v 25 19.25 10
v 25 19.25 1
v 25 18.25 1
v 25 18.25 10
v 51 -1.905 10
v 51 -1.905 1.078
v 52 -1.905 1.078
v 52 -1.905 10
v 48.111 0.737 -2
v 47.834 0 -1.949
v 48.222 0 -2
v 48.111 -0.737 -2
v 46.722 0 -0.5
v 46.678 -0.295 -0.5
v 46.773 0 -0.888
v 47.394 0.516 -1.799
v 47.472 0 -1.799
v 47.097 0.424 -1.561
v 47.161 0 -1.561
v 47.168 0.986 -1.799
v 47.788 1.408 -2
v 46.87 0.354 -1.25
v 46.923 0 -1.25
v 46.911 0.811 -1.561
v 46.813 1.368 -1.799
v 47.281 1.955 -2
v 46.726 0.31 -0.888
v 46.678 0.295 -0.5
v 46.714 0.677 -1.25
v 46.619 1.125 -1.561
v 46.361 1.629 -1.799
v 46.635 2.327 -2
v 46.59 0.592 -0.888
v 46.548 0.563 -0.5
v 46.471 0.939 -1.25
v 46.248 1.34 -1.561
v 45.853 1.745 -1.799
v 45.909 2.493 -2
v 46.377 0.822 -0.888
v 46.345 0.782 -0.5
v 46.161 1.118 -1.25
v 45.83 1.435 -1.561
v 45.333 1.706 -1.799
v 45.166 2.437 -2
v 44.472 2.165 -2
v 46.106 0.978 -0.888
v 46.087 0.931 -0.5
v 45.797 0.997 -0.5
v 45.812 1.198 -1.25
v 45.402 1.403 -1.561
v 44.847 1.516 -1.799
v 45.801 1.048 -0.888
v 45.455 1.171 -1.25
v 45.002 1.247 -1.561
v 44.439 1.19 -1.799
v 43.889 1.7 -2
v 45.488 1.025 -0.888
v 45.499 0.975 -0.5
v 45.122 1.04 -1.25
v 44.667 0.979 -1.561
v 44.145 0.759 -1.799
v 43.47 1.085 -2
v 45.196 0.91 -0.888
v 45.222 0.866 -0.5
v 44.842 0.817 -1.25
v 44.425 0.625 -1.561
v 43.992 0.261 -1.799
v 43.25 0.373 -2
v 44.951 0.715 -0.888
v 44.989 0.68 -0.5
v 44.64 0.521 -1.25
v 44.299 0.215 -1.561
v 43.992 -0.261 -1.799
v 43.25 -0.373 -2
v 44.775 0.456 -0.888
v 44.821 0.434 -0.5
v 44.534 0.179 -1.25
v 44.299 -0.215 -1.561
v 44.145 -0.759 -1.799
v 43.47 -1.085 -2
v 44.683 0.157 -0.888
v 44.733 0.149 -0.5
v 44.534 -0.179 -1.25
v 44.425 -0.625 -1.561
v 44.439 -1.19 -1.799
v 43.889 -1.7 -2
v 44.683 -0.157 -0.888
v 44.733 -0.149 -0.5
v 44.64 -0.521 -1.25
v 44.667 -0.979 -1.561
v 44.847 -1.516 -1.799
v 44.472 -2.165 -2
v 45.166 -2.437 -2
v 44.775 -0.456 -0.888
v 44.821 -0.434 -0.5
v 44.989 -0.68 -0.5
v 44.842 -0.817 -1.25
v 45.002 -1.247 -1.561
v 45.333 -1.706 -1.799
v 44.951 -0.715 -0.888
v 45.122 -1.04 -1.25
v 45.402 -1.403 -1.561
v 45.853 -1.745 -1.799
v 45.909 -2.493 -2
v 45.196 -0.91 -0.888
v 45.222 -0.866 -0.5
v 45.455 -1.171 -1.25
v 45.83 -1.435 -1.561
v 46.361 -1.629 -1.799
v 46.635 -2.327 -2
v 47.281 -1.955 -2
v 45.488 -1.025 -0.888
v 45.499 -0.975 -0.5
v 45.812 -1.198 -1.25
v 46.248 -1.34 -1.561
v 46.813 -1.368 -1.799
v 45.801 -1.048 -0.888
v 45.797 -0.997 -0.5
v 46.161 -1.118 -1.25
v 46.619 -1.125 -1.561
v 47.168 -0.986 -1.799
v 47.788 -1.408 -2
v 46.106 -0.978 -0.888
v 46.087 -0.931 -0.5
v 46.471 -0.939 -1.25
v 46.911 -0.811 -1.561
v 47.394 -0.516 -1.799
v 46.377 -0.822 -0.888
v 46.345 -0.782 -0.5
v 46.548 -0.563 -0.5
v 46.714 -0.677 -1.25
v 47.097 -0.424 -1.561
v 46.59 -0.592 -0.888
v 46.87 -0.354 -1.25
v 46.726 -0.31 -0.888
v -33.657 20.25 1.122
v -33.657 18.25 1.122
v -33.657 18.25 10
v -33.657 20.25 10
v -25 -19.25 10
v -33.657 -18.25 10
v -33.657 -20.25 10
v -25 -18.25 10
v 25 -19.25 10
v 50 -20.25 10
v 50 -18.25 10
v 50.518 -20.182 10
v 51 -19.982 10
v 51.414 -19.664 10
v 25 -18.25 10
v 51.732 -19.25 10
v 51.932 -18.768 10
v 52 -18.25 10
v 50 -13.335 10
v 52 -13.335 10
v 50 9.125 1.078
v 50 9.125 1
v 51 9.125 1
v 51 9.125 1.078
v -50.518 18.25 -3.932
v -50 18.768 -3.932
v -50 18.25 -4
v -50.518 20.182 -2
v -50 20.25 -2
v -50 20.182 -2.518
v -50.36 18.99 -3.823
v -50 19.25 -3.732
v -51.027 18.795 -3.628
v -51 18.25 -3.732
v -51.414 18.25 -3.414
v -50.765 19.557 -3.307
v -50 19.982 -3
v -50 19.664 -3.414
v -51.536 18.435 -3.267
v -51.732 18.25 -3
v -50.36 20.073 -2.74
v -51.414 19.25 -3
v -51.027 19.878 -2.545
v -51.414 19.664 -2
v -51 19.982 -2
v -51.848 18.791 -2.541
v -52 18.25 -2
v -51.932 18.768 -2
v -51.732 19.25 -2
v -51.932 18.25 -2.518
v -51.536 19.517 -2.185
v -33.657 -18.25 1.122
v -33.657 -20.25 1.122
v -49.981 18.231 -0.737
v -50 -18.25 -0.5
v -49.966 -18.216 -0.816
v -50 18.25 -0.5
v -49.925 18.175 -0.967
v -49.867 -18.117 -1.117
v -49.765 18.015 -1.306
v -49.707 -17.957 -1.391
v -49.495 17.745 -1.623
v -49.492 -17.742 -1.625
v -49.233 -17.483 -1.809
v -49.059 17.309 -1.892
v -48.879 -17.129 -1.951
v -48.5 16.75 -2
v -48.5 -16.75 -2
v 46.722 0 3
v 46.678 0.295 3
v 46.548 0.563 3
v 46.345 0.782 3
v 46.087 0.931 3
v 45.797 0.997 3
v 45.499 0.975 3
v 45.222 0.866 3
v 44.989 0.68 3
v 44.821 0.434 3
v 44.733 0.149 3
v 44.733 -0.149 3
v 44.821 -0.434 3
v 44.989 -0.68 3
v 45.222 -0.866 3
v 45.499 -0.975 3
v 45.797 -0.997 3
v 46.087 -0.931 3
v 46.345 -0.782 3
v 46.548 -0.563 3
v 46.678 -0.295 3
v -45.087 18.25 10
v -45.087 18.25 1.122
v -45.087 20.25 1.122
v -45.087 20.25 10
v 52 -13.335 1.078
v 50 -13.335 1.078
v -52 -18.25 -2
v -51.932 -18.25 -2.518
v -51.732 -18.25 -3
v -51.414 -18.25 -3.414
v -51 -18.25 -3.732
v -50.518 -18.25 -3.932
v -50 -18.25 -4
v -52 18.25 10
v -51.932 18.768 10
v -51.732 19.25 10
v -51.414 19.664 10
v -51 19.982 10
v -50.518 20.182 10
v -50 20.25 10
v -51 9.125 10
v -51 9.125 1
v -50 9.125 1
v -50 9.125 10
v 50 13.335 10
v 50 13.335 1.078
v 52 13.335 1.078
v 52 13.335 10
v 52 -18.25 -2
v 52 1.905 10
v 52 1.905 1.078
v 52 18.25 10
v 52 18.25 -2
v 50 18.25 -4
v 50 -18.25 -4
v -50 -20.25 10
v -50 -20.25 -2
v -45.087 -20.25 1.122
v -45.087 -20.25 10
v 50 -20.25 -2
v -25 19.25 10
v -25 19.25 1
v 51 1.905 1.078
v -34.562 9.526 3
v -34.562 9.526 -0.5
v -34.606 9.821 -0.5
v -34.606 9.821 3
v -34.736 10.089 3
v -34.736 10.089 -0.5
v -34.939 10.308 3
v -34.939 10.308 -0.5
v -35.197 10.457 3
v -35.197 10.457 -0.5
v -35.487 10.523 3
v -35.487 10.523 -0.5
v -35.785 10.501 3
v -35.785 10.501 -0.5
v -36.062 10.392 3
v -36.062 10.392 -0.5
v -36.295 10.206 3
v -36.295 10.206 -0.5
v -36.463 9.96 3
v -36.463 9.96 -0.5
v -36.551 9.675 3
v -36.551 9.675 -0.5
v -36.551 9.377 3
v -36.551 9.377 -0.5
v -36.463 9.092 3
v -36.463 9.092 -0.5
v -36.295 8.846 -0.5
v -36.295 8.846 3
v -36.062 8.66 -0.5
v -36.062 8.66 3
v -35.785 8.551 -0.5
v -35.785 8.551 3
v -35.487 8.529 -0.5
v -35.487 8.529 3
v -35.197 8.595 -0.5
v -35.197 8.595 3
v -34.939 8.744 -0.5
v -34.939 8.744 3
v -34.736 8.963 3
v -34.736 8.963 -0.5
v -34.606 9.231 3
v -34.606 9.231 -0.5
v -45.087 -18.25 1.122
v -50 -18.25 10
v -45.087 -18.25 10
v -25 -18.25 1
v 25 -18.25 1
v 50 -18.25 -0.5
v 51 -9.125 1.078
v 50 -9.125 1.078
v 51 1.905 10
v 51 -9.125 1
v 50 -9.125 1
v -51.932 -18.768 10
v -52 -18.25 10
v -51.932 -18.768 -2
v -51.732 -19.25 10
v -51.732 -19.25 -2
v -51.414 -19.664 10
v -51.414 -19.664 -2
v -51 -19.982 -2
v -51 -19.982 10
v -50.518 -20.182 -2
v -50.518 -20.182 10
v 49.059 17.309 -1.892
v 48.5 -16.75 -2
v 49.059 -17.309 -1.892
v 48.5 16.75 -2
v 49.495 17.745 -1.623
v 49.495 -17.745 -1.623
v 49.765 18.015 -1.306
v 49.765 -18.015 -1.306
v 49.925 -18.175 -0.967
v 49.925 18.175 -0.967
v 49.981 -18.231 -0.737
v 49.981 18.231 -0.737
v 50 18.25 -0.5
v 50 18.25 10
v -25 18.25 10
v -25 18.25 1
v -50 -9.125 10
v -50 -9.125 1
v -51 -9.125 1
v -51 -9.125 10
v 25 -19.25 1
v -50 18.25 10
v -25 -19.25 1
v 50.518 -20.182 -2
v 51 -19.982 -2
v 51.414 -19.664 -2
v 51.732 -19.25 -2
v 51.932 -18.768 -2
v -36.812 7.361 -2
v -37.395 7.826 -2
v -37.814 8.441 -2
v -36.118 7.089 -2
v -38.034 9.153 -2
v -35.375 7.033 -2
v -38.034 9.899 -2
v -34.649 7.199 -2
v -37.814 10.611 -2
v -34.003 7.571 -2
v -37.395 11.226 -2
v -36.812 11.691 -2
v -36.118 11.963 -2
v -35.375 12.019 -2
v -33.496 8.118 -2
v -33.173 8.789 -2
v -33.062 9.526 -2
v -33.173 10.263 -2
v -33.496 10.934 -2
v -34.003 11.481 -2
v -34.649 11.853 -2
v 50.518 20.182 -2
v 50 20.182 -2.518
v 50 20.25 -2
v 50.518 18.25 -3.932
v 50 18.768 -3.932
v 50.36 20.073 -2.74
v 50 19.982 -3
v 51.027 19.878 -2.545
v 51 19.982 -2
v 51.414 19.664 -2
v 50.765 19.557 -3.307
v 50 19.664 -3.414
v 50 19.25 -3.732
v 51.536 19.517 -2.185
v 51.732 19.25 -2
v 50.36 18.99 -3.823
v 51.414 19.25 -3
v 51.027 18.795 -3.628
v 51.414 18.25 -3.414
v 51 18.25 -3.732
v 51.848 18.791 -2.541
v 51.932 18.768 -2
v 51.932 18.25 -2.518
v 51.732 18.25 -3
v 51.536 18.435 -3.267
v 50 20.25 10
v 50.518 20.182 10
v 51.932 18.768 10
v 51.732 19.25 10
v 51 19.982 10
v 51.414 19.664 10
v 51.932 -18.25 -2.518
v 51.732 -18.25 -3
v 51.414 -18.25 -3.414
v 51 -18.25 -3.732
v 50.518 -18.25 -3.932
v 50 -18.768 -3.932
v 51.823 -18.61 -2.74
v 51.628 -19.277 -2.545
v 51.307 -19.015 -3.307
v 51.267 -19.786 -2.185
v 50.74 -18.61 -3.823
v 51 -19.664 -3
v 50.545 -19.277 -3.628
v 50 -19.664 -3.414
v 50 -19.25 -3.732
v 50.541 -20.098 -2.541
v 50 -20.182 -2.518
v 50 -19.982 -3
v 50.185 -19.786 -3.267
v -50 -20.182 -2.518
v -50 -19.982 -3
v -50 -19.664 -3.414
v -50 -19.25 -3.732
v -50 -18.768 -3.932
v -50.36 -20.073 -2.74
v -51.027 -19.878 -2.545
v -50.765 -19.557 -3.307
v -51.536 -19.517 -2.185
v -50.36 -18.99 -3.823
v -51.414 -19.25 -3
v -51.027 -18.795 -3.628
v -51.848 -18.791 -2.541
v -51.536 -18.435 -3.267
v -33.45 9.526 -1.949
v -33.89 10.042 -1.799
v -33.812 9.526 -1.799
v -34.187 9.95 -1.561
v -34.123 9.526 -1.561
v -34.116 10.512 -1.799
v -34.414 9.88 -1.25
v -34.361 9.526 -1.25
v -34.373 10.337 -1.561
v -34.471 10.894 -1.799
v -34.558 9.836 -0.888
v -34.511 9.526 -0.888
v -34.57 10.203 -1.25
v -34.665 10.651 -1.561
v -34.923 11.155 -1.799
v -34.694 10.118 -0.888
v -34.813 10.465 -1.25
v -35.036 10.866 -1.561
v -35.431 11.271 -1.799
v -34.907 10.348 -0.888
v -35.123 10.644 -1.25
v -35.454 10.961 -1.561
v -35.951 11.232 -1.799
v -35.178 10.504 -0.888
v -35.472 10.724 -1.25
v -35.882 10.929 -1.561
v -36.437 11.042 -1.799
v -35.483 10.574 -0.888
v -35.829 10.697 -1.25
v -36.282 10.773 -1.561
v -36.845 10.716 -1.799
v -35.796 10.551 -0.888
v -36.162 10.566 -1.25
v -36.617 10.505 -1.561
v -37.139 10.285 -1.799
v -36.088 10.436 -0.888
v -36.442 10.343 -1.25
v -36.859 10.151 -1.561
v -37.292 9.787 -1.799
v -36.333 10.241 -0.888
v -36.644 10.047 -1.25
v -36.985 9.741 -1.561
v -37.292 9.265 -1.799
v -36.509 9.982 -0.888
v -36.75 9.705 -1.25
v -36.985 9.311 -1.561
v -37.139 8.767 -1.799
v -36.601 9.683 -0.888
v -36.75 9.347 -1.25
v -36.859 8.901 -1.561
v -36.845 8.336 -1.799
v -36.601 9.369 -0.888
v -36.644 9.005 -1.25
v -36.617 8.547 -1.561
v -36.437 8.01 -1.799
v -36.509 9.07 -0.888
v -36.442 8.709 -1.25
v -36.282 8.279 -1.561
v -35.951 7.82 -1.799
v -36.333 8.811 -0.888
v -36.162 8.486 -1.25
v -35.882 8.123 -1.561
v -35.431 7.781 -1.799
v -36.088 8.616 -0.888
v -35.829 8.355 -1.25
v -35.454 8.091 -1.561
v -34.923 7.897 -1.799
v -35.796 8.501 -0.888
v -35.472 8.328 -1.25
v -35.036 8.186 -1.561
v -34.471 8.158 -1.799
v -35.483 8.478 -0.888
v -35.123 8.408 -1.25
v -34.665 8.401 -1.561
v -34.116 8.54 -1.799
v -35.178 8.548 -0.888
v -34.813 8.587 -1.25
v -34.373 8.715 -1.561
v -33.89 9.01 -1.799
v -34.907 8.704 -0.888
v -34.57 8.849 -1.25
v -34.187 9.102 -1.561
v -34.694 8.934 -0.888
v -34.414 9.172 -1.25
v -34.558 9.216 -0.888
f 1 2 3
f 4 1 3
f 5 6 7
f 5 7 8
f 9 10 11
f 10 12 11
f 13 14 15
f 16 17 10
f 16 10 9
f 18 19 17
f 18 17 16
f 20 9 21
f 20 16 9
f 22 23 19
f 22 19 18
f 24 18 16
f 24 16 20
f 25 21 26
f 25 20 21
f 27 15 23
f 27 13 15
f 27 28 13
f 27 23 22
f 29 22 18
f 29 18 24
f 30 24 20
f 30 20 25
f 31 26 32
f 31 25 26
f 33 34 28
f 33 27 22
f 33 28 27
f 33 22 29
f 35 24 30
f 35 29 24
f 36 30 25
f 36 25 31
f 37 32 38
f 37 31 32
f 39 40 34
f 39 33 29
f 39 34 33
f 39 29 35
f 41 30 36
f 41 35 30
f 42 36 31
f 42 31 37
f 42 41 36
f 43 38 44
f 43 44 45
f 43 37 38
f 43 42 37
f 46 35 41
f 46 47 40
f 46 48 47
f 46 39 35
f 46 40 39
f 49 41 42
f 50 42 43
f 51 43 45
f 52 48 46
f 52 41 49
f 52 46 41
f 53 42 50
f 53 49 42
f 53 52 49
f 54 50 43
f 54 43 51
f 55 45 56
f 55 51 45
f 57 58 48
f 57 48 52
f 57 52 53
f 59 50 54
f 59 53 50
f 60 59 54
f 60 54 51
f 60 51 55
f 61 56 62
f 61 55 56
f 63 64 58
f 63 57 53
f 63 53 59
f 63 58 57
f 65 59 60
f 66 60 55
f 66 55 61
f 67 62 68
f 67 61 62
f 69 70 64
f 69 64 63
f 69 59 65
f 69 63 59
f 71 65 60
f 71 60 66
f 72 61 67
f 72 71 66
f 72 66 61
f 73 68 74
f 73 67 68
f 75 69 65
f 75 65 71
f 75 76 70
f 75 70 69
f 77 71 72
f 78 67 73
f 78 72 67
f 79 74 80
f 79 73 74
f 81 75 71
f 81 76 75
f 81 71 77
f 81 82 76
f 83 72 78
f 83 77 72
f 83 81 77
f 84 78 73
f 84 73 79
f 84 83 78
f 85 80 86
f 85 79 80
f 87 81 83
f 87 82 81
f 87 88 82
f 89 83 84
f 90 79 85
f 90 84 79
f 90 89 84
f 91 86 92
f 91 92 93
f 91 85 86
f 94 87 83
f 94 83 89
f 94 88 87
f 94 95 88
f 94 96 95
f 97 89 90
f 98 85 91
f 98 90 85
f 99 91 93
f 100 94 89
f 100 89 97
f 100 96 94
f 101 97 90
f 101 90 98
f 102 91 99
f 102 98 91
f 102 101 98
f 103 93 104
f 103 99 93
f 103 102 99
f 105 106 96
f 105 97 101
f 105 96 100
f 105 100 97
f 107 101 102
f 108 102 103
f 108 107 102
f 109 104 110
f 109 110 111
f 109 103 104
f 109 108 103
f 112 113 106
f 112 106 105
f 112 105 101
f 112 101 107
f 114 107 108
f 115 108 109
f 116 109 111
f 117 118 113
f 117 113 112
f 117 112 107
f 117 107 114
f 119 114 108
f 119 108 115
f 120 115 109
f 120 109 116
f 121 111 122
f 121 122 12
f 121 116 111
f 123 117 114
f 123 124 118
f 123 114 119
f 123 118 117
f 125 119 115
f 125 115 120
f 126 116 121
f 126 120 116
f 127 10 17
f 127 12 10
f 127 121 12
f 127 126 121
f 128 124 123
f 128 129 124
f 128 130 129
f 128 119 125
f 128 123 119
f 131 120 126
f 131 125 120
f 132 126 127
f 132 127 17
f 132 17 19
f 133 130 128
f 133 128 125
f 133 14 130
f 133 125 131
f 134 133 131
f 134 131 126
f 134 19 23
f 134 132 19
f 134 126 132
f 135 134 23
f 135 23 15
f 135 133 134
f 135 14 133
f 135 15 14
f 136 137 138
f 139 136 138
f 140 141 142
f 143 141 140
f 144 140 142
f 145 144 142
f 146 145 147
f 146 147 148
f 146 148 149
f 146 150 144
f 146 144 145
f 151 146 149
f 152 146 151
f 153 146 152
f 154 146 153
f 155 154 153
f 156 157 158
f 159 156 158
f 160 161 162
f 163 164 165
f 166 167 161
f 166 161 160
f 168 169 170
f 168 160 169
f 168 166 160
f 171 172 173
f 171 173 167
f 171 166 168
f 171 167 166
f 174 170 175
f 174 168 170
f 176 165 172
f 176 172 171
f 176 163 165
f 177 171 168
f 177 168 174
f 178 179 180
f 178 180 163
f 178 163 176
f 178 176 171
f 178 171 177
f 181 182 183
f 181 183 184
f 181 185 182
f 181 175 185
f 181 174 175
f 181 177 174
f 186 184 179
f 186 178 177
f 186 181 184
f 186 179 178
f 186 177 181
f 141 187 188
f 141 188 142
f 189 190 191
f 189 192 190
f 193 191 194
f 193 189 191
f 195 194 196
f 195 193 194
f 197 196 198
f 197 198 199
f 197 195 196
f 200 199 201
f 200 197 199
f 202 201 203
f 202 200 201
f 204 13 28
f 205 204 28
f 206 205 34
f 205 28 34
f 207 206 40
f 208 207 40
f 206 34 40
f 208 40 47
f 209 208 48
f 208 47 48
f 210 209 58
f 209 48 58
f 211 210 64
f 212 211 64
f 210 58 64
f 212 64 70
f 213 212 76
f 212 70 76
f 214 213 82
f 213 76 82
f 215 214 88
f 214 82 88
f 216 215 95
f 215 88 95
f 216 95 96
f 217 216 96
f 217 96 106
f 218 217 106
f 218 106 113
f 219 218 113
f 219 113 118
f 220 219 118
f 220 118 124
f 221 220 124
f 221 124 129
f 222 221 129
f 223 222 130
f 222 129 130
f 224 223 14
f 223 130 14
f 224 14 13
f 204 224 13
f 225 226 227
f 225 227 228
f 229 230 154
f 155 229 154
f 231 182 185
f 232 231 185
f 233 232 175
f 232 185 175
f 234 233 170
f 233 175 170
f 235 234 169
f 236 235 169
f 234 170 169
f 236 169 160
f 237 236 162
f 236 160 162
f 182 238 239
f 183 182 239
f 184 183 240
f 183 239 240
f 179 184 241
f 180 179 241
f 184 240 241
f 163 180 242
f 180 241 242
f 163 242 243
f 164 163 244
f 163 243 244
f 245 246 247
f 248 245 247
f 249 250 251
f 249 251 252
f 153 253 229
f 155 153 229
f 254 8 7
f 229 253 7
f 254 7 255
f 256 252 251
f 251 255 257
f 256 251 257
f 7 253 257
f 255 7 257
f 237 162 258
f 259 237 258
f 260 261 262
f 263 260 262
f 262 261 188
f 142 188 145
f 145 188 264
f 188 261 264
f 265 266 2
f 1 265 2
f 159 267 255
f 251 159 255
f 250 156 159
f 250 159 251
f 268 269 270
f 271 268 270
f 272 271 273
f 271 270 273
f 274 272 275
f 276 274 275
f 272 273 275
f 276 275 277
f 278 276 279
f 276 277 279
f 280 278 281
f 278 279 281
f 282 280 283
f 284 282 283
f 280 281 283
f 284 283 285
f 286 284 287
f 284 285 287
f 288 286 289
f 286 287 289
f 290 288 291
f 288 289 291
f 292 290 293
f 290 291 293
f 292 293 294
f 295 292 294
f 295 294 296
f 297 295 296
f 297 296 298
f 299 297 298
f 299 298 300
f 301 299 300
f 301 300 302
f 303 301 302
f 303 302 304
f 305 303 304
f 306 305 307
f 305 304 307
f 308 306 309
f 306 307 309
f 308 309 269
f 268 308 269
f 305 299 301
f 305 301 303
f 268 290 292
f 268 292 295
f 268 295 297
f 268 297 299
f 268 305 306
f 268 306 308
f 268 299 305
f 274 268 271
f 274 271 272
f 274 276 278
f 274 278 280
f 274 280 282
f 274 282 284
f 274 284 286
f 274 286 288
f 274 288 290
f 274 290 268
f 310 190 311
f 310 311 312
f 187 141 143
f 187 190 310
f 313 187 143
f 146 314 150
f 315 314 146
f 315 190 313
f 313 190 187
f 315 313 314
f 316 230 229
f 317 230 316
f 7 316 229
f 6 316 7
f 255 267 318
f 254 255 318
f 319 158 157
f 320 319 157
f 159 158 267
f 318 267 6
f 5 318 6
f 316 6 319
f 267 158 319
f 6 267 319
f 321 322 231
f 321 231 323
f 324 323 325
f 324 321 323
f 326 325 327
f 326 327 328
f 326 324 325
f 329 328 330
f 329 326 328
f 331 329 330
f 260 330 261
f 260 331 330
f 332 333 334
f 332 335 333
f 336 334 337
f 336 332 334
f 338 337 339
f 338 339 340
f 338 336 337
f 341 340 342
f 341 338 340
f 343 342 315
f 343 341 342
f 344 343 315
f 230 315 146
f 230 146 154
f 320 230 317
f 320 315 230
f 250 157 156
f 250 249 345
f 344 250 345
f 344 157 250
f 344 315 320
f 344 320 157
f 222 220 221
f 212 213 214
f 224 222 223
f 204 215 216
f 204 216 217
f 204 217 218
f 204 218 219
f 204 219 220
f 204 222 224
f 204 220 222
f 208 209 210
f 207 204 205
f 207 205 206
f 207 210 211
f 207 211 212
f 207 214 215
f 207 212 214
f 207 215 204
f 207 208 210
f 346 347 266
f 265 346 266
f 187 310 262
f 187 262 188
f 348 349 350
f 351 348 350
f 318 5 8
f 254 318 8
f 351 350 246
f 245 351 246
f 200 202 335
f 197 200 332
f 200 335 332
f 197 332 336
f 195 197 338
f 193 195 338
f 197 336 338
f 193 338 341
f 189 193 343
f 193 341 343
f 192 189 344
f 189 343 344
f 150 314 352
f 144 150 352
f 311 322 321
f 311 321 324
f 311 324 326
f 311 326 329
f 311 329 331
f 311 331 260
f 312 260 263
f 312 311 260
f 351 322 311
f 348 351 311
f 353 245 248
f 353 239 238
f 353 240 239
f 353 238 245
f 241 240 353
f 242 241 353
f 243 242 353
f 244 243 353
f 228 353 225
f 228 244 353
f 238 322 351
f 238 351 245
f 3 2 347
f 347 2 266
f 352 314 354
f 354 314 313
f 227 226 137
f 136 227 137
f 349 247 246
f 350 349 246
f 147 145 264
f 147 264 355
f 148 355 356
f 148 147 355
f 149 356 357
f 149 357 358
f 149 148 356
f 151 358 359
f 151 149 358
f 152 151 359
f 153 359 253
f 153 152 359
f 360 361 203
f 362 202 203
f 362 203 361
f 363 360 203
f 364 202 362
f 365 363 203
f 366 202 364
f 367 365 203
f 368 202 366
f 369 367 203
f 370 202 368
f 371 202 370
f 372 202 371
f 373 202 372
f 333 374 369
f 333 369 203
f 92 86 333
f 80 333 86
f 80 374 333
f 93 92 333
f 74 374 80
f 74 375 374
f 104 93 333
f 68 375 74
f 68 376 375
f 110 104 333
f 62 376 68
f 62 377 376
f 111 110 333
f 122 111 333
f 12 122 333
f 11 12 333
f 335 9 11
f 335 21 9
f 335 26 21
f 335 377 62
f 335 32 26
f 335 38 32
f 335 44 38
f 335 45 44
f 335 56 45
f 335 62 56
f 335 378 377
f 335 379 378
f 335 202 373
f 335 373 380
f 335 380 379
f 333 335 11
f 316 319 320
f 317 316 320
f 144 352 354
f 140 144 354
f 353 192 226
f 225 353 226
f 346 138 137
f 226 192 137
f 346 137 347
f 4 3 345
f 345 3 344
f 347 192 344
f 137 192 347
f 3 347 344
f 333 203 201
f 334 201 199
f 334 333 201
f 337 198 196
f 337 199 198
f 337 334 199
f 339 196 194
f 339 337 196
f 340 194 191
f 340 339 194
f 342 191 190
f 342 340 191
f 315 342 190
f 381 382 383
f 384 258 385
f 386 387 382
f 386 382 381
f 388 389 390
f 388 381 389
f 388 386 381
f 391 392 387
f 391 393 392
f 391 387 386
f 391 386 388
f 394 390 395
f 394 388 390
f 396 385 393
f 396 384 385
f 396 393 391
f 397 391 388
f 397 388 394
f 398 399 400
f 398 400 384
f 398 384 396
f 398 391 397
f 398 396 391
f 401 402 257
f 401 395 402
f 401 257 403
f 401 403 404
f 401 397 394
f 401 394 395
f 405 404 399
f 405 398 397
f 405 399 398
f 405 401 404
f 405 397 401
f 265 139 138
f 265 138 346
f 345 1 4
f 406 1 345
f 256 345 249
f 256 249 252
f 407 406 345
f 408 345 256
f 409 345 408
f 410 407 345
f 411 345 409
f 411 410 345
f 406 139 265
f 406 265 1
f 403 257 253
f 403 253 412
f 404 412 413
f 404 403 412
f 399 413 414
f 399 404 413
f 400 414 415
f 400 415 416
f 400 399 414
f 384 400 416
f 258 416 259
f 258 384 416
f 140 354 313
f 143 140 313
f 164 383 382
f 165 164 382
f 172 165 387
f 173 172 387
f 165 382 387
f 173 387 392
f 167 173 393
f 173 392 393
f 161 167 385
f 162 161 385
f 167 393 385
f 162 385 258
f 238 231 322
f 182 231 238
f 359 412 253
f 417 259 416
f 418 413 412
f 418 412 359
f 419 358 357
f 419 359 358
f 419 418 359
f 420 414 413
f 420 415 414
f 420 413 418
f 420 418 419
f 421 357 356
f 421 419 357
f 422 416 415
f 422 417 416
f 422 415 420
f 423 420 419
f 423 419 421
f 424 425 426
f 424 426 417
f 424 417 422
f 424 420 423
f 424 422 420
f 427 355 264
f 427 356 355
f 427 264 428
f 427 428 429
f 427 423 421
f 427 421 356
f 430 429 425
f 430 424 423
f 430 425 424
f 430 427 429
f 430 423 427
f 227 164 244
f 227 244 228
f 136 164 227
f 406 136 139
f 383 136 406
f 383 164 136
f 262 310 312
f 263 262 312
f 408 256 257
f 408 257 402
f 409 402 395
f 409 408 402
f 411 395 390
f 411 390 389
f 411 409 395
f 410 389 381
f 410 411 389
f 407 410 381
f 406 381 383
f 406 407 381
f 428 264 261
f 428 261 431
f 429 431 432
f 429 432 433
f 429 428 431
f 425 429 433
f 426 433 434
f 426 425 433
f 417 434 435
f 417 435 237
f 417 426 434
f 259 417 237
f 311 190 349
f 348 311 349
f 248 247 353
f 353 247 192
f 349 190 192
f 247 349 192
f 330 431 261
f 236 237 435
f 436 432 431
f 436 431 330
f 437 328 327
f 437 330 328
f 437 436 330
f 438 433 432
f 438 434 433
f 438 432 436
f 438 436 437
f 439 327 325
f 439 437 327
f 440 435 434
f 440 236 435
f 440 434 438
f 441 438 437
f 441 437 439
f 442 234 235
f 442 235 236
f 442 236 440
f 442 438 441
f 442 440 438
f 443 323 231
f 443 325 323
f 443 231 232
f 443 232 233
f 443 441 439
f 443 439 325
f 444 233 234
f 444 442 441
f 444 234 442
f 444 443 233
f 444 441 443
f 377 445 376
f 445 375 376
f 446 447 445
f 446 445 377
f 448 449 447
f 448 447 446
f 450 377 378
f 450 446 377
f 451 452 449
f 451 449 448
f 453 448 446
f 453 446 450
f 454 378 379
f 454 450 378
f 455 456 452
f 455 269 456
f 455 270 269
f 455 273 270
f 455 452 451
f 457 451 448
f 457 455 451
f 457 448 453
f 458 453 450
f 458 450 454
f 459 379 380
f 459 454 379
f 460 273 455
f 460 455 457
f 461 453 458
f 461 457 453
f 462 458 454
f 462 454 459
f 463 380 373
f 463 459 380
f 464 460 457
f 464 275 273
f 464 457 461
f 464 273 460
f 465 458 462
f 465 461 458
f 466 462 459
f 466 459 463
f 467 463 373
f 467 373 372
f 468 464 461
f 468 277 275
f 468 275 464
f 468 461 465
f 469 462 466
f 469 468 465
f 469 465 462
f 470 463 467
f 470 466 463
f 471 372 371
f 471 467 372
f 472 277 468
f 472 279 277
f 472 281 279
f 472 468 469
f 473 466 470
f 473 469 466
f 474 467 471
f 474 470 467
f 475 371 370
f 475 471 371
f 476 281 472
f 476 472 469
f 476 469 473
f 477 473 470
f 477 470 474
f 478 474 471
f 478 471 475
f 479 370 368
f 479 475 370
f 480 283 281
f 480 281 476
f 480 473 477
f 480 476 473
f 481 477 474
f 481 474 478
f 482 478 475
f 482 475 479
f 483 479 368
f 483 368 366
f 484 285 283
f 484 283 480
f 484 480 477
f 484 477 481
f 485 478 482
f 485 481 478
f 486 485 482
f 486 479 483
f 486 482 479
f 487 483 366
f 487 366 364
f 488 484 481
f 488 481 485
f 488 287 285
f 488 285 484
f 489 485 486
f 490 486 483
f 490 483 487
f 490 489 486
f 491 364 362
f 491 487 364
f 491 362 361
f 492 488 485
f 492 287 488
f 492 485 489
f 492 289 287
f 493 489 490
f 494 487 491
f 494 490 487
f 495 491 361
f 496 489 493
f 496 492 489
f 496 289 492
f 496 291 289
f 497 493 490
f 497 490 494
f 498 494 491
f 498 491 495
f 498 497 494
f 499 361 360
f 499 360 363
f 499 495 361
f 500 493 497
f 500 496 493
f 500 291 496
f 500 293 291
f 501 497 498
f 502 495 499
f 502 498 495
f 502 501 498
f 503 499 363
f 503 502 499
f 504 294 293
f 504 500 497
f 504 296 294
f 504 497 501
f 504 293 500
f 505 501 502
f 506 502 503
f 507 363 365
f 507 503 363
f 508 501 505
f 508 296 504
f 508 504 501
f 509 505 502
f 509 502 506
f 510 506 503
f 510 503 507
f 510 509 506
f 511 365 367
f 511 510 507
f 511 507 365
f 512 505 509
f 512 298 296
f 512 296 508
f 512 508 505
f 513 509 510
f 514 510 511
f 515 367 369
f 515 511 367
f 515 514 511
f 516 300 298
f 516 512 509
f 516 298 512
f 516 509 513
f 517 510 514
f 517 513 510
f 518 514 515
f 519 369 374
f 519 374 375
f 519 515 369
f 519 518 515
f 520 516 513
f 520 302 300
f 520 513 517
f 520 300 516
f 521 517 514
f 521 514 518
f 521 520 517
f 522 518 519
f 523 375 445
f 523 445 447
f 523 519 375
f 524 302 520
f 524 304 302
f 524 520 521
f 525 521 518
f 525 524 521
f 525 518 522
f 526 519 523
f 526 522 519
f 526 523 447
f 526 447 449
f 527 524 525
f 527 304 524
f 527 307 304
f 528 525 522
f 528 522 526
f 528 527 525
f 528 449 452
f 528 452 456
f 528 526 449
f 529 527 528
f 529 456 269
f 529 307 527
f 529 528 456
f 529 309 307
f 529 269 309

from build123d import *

# Parameters (mm, degrees)
SKETCH002_W          = 100
SKETCH002_H          = 36.5
PAD002_DEPTH         = 12
THICKNESS_T          = 2
POCKET_DEPTH         = 9.001
SKETCH018_W          = 11.43
SKETCH018_H          = 15.122581
POCKET001_DEPTH      = 52.001
SKETCH019_W          = 11.43
SKETCH019_H          = 14.044283
POCKET002_DEPTH      = 20.251
POCKET002_DEPTH_BACK = 20.251
SKETCH003_R          = 1
PAD003_DEPTH         = 5
FILLET_R             = 1.5


with BuildPart() as part:
    # Sketch002 → Pad002 (new body)
    with BuildSketch(Plane.XY):
        Rectangle(SKETCH002_W, SKETCH002_H)
    extrude(amount=PAD002_DEPTH)

    # Thickness
    thickness_openings = [part.faces().sort_by_distance(p)[0] for p in [
        (0, 0, 12),
    ]]
    offset(amount=THICKNESS_T, openings=thickness_openings)

    # Sketch012 → Pocket (cut, through all)
    with BuildSketch(Plane.XY.offset(3)):
        Polygon((-25, 19.25), (25, 19.25), (25, 9.125), (51, 9.125), (51, -9.125), (25, -9.125), (25, -19.25), (-25, -19.25), (-25, -9.125), (-51, -9.125), (-51, 9.125), (-25, 9.125), align=None)
    extrude(amount=POCKET_DEPTH, mode=Mode.SUBTRACT)

    # Sketch018 → Pocket001 (cut, through all)
    with BuildSketch(Plane.YZ):
        with Locations((-7.62, 10.638799)):
            Rectangle(SKETCH018_W, SKETCH018_H)
        with Locations((7.62, 10.638799)):
            Rectangle(SKETCH018_W, SKETCH018_H)
    extrude(amount=POCKET001_DEPTH, mode=Mode.SUBTRACT)

    # Sketch019 → Pocket002 (cut, two sides)
    with BuildSketch(Plane.XZ) as pocket002_sk:
        with Locations((-39.372, 10.143712)):
            Rectangle(SKETCH019_W, SKETCH019_H)
    extrude(amount=POCKET002_DEPTH, mode=Mode.SUBTRACT)
    extrude(pocket002_sk.sketch, amount=-POCKET002_DEPTH_BACK, mode=Mode.SUBTRACT)

    # Sketch003 → Pad003 (join)
    with BuildSketch(Plane.XY):
        with Locations((-35.562, 9.526)):
            Circle(SKETCH003_R)
        with Locations((45.722, 0)):
            Circle(SKETCH003_R)
    extrude(amount=PAD003_DEPTH)

    # Fillet
    fillet_edges = [part.edges().sort_by_distance(p)[0] for p in [
        (0, 18.25, 0),
        (-50, 0, 0),
        (50, 0, 0),
        (0, -18.25, 0),
        (44.722, 0, 0),
        (-36.562, 9.526, 0),
    ]]
    fillet(fillet_edges, radius=FILLET_R)


with BuildPart() as part_1:
    # Body001 placement: moved
    add(part.part.moved(Location((0, 0, -2))))


solid = part_1.part
